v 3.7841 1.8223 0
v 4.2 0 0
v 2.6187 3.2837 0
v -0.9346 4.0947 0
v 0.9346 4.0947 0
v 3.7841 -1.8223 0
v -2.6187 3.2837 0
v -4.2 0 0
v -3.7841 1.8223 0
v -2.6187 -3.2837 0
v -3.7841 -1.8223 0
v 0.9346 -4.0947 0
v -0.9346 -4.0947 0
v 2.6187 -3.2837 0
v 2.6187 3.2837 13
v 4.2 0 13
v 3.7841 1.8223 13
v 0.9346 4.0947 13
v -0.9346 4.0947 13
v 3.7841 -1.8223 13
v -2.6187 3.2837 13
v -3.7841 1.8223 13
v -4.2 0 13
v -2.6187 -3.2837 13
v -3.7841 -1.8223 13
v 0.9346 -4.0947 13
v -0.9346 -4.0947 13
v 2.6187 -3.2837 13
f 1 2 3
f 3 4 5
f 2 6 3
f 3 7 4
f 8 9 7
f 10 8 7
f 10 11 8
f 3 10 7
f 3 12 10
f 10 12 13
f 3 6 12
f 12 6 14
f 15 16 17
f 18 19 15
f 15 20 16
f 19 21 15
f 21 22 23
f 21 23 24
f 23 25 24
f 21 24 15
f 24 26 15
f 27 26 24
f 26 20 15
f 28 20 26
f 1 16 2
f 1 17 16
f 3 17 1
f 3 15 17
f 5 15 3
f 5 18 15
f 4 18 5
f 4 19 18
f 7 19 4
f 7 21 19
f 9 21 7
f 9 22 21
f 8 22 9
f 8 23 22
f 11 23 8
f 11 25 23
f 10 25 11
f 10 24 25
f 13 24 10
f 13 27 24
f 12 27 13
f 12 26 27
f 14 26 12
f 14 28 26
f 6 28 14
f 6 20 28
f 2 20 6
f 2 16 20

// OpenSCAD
// A gray cylinder. Hurrah!
color("gray")
    linear_extrude(height = 13.0)
        circle(4.2);
